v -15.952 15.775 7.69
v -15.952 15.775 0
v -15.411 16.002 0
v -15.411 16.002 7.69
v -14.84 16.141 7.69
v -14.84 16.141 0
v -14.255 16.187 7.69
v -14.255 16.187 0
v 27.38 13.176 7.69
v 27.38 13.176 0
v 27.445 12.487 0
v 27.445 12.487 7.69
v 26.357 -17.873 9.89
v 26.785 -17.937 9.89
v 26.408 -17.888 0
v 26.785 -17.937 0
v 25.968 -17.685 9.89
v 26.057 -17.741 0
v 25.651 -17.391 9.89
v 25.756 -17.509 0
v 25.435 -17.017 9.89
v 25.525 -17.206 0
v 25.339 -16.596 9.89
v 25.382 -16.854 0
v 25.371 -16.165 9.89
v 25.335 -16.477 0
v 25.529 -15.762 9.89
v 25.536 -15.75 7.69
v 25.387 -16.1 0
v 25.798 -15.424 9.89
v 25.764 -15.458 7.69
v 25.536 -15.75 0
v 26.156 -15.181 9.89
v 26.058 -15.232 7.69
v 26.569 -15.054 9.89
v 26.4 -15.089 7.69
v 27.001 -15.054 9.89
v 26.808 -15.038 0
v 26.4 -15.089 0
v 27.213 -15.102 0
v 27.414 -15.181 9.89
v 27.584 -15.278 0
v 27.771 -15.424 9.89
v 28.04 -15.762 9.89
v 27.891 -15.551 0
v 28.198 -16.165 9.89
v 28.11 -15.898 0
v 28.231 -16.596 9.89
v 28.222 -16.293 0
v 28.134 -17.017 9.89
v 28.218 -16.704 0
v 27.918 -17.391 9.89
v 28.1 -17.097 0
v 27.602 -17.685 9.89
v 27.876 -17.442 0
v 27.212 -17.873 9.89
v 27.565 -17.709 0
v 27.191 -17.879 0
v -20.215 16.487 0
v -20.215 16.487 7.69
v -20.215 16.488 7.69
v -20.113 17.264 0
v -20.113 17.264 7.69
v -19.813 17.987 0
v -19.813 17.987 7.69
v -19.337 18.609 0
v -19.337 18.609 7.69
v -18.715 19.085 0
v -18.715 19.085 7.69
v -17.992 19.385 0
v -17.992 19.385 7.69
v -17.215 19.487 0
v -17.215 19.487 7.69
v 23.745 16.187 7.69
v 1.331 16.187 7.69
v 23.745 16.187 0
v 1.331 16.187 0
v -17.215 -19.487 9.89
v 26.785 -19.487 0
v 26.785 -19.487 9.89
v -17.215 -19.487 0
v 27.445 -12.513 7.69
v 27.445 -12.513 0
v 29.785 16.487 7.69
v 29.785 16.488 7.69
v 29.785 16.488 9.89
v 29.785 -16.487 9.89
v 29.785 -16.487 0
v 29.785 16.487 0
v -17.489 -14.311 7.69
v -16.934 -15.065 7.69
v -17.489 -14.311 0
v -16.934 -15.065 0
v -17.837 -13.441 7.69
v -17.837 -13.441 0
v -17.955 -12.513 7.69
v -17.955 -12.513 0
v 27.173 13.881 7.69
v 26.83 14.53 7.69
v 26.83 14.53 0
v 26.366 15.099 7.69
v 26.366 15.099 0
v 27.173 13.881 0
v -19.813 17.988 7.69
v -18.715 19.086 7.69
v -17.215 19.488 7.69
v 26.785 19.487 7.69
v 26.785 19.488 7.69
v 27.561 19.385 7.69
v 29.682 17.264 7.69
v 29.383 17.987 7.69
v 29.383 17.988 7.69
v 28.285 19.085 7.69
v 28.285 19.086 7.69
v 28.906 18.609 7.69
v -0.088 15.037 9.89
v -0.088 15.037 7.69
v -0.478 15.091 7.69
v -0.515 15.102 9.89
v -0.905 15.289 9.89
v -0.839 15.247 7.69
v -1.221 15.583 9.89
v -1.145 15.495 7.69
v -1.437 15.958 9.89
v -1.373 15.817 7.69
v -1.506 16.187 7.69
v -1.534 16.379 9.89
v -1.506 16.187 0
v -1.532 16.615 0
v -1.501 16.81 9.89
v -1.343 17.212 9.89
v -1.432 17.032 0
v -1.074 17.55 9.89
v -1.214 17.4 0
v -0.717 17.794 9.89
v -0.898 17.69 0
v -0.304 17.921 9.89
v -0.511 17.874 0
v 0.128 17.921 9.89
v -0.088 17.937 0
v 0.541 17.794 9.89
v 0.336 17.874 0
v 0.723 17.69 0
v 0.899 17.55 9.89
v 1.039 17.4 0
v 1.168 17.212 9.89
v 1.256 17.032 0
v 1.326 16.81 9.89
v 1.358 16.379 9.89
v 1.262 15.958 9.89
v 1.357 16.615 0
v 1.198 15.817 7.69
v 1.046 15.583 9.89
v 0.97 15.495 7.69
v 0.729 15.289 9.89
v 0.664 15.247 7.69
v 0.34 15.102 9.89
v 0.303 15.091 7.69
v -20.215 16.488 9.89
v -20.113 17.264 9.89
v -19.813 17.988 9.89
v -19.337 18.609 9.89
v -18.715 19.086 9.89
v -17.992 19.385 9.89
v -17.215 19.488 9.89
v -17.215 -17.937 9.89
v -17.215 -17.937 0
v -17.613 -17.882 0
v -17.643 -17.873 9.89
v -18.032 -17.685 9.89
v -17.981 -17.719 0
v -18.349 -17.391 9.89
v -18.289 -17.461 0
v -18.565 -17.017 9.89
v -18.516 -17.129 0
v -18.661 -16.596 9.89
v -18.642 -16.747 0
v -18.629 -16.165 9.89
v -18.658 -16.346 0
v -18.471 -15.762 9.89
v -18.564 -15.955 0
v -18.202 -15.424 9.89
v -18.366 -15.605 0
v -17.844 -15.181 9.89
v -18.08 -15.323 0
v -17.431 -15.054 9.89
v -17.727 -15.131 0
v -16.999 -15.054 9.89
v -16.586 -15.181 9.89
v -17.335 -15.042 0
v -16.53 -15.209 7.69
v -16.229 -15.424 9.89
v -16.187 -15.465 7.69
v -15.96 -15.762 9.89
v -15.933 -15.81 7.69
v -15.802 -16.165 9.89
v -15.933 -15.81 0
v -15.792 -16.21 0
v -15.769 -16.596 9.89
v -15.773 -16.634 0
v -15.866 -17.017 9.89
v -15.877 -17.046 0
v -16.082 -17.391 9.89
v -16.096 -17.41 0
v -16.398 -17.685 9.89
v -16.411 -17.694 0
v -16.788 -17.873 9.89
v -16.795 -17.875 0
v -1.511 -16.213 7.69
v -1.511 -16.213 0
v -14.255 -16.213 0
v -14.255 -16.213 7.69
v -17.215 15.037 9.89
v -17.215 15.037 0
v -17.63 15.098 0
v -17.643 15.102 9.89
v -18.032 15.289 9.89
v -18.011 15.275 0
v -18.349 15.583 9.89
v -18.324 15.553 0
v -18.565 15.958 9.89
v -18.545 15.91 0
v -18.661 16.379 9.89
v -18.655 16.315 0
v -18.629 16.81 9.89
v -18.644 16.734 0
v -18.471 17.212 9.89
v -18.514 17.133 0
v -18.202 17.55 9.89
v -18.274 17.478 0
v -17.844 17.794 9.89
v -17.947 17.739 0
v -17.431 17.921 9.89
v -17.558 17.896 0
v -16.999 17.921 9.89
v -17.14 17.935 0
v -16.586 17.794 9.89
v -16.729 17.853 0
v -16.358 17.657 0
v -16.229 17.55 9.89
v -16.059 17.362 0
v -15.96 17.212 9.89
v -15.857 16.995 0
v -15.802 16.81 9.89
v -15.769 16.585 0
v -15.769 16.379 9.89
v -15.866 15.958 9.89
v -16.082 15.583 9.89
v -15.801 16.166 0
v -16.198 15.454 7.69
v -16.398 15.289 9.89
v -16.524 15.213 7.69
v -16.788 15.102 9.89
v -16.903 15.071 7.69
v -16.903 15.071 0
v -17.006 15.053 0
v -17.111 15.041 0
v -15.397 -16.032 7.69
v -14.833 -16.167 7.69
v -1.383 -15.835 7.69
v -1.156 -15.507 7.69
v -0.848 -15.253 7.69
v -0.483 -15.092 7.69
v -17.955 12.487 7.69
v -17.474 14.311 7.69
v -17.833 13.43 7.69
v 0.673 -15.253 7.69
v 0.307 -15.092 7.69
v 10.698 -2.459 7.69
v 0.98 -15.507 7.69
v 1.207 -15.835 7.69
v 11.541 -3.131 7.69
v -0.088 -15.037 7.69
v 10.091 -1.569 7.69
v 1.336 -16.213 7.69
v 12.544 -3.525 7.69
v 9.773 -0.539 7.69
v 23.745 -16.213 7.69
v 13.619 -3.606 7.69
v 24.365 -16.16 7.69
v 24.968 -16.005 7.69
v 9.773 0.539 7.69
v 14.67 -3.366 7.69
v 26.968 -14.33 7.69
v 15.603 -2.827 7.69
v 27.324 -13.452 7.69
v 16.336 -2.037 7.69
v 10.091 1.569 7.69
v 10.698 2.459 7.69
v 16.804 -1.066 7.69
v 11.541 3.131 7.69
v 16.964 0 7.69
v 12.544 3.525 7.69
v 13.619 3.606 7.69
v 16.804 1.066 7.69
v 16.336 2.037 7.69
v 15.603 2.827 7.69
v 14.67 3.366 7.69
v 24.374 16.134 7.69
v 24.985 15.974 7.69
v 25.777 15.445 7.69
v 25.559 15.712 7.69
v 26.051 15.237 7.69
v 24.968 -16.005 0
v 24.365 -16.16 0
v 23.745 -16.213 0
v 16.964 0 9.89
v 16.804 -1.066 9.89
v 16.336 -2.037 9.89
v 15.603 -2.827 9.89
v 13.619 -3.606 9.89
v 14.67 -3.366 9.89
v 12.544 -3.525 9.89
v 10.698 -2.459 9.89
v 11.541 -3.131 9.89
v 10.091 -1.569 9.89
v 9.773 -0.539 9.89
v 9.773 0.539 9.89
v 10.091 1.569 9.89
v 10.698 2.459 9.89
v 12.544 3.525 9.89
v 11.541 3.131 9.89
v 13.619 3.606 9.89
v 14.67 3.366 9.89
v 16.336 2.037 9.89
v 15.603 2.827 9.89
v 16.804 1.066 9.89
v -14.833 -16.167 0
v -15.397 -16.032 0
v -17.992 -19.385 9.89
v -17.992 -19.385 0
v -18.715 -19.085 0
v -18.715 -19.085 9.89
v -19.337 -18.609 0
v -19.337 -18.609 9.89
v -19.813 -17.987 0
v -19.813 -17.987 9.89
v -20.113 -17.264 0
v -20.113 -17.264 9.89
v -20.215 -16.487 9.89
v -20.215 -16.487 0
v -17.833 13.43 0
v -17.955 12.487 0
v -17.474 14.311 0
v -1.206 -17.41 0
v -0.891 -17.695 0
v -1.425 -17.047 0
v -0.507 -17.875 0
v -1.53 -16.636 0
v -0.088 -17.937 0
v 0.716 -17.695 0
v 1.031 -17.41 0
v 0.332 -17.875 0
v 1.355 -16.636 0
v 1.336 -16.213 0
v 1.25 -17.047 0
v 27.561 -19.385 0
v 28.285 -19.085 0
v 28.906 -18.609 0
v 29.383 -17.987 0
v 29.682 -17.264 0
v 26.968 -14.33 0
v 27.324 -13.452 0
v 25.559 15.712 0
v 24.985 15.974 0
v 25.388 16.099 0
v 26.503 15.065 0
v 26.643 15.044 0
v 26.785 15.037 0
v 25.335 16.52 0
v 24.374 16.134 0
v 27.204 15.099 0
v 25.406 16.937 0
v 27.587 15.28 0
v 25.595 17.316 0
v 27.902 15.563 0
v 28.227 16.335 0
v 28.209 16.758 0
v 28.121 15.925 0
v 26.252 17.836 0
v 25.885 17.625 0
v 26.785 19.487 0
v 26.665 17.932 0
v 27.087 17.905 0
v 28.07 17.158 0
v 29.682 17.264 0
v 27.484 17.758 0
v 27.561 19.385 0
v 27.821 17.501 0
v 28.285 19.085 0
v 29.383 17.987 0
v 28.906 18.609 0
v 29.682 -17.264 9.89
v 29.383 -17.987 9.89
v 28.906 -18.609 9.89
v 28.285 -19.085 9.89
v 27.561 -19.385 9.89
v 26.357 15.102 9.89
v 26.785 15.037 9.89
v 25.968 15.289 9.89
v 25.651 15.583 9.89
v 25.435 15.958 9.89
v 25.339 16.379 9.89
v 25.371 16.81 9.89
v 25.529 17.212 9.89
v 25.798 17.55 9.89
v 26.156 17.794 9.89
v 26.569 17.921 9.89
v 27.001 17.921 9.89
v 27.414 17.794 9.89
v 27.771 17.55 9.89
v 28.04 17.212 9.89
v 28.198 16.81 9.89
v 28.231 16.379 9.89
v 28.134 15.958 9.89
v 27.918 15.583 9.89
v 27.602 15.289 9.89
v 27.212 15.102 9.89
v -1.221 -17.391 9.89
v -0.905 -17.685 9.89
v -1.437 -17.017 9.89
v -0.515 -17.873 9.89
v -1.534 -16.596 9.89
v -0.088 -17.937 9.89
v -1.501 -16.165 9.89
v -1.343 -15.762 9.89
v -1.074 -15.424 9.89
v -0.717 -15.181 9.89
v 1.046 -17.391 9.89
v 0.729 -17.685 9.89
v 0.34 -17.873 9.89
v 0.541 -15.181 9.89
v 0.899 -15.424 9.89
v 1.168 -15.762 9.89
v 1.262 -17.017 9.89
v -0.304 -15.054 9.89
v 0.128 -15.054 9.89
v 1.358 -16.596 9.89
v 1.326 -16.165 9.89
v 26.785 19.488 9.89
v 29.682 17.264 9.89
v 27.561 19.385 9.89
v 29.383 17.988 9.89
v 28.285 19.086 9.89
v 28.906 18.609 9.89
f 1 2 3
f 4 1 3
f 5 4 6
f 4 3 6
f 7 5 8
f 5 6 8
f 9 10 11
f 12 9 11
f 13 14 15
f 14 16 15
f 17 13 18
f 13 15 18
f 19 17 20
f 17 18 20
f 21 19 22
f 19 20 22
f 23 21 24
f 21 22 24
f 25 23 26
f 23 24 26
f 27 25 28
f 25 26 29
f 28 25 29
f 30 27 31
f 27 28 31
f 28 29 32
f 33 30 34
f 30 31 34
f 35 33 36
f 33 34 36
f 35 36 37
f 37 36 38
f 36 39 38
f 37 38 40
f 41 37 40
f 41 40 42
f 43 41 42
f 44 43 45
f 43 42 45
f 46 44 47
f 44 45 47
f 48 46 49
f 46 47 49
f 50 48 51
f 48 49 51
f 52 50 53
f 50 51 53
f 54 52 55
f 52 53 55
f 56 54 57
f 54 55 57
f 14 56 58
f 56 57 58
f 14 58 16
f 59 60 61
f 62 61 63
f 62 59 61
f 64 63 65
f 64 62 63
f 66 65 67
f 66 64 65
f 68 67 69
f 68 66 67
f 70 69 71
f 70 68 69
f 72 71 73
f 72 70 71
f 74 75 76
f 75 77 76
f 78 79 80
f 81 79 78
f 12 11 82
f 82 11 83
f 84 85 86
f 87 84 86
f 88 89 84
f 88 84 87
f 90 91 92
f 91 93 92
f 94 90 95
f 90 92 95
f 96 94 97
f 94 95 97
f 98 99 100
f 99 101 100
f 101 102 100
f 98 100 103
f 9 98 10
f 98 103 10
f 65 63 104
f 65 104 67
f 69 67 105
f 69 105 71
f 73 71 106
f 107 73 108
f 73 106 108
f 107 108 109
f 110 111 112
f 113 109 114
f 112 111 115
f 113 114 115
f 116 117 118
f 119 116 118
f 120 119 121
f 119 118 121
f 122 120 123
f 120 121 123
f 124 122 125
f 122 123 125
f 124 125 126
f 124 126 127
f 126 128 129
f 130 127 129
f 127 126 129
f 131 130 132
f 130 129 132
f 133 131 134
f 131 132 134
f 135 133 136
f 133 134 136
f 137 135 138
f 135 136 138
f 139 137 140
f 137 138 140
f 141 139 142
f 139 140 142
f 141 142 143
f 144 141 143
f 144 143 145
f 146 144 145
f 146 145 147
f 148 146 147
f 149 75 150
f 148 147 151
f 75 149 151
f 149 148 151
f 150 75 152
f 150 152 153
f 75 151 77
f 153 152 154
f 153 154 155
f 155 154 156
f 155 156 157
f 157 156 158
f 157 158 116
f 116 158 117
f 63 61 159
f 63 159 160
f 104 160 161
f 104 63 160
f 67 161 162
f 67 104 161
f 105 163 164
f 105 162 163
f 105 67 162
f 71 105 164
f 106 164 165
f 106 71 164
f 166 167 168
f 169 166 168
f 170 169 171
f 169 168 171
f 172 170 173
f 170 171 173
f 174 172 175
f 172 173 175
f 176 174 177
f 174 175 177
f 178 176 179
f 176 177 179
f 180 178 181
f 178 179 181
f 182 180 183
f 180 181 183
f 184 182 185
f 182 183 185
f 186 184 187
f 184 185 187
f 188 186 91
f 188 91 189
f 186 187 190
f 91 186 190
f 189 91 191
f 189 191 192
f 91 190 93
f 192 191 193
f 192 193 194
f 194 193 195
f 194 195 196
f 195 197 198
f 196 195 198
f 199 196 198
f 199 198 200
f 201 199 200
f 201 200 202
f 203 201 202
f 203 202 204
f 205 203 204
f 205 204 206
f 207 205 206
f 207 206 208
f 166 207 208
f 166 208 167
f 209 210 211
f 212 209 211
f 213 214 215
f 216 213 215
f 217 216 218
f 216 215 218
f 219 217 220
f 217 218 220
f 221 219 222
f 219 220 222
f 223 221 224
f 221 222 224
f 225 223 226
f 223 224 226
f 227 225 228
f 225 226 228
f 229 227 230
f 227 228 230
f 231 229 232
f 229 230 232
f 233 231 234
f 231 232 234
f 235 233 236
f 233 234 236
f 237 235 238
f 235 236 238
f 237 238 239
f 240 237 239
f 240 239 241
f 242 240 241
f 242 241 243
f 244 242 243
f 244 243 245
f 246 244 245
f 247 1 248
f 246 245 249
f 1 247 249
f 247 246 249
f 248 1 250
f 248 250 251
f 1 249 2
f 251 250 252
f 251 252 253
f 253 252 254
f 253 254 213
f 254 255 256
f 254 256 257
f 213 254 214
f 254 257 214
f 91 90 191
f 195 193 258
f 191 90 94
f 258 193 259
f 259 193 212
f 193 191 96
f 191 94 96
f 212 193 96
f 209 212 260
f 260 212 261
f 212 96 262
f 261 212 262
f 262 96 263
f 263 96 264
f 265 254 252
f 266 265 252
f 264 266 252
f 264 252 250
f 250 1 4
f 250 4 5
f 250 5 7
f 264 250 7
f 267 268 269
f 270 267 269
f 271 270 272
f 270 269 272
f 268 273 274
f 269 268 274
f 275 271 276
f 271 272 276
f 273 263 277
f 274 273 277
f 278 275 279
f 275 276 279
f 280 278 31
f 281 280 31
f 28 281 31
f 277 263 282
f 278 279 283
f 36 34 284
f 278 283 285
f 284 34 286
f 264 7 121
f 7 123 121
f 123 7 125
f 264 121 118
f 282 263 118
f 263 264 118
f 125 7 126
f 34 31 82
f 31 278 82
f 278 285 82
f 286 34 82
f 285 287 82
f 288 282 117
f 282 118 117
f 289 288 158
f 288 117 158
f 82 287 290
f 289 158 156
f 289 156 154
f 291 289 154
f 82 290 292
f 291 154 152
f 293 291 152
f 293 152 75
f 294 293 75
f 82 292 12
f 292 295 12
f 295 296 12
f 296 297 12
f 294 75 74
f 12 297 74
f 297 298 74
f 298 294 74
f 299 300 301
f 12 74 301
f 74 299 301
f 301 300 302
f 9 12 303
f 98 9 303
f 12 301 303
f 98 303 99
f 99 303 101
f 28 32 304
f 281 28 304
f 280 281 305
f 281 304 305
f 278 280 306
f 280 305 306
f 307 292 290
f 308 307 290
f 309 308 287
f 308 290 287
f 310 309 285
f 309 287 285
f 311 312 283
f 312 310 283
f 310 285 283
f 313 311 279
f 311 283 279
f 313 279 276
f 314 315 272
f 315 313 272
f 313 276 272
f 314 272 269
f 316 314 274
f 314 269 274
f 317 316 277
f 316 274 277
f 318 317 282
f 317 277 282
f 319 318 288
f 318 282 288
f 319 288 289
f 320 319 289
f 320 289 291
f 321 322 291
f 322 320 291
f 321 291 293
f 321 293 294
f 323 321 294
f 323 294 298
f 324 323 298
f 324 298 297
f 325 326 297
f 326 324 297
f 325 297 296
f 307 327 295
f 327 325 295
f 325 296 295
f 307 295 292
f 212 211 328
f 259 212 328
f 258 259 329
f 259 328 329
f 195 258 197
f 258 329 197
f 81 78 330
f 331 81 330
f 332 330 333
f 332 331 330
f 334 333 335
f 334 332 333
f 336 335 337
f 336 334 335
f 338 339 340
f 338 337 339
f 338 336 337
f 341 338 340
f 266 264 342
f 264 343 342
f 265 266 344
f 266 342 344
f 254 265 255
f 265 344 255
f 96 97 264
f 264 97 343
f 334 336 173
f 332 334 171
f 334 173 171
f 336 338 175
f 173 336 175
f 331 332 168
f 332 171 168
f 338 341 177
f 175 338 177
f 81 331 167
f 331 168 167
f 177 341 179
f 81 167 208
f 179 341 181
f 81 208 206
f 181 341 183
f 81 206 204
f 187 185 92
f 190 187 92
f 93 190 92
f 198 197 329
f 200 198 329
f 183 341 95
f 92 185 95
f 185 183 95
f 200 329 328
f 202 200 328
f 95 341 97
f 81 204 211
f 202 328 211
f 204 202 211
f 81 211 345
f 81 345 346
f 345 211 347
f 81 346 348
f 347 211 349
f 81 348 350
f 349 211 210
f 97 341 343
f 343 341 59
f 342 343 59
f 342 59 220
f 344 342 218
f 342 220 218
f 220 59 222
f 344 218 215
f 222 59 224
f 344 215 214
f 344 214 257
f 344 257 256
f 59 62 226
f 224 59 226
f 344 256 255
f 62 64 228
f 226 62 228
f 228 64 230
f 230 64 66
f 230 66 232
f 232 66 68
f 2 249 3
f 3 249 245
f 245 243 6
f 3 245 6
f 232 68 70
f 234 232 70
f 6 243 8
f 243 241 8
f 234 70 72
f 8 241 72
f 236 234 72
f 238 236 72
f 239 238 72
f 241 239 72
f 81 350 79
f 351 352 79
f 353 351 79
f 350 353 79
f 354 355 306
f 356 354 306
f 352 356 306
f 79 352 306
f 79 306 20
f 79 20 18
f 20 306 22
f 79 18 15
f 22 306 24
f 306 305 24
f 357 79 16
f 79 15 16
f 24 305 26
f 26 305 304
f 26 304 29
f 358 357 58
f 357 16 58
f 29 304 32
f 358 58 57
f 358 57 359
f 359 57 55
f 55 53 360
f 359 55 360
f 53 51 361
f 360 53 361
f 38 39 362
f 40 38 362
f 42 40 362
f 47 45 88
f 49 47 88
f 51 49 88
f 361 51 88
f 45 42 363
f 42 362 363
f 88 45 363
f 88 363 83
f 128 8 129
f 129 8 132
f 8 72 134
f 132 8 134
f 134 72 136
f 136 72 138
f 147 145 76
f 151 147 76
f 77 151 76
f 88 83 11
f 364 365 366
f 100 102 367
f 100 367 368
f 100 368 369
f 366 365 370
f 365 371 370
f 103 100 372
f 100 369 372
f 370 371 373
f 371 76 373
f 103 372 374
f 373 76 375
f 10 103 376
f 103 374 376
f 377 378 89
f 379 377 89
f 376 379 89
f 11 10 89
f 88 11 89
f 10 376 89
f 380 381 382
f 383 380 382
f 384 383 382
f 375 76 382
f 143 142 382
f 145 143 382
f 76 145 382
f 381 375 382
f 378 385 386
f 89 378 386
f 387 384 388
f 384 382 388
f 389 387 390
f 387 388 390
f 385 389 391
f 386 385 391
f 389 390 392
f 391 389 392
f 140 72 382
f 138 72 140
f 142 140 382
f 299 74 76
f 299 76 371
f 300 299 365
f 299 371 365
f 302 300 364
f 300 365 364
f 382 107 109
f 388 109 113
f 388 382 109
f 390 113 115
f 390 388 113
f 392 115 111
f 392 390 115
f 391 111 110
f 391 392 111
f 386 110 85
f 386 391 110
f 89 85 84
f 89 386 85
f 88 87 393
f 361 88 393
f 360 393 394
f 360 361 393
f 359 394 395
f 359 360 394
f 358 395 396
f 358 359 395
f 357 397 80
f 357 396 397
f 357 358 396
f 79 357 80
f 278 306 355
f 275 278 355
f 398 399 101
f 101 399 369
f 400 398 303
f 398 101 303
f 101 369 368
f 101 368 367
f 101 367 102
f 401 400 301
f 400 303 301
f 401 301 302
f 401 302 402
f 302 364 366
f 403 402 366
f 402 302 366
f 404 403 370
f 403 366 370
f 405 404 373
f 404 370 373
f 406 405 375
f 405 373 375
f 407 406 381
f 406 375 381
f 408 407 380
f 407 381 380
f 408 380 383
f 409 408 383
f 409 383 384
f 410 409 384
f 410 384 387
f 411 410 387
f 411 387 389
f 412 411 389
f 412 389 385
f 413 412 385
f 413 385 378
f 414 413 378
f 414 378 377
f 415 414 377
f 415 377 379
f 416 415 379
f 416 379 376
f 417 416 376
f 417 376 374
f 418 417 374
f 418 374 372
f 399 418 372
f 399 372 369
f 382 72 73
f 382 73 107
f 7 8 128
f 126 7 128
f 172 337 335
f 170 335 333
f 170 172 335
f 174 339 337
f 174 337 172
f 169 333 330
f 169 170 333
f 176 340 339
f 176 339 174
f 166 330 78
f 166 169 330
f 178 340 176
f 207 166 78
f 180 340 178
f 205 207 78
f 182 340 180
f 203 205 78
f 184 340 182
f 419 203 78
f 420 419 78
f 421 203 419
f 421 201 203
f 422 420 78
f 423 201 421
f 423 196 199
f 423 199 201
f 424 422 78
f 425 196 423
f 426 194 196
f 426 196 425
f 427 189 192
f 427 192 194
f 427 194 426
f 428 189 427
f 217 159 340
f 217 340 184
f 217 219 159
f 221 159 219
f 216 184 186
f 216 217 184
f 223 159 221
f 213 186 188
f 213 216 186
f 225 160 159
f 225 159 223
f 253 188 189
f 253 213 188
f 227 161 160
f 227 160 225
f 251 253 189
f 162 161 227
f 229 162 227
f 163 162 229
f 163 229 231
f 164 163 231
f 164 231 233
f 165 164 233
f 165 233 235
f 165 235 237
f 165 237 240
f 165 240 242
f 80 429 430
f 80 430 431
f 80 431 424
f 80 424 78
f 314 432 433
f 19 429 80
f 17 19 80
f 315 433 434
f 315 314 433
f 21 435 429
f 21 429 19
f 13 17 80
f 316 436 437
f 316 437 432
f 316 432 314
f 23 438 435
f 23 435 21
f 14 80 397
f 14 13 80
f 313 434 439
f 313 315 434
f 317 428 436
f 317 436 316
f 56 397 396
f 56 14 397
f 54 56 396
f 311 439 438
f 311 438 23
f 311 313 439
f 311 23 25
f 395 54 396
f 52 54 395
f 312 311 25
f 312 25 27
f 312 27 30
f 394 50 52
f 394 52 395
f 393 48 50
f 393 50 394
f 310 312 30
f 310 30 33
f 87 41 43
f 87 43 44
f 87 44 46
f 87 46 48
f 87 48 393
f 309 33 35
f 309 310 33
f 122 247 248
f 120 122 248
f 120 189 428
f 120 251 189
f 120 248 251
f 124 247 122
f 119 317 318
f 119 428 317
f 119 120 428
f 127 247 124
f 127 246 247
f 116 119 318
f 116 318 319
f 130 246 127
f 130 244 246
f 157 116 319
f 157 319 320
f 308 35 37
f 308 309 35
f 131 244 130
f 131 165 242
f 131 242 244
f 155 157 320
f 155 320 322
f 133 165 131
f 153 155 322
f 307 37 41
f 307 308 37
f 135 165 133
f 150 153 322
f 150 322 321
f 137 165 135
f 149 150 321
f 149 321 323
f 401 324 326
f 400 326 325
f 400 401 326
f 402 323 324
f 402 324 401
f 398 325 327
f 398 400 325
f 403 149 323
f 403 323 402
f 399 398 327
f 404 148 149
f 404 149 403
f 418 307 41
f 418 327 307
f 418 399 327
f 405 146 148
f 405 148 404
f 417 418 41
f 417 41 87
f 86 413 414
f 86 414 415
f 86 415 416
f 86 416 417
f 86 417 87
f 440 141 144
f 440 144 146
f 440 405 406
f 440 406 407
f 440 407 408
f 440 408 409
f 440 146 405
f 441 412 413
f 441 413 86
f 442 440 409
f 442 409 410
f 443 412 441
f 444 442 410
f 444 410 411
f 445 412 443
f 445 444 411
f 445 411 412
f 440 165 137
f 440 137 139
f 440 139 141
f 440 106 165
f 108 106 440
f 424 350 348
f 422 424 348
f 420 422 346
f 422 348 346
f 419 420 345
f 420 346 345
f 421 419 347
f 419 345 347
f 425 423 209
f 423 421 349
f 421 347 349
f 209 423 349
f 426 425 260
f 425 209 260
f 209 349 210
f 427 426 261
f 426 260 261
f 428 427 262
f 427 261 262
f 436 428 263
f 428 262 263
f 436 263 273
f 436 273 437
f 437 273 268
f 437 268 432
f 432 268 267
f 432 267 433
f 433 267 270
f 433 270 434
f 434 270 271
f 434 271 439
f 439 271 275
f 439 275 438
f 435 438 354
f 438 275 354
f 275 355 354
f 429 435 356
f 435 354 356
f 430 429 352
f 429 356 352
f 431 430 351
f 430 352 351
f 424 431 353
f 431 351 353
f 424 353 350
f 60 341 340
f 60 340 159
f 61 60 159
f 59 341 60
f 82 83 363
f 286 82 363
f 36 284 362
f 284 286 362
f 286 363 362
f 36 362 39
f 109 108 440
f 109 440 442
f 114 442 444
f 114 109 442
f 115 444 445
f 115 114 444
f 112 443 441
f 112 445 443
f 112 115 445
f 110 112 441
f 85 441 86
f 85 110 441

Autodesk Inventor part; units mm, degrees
ref_plane "YZ Plane" through (0, 0, 0) normal (1, 0, 0) x (0, 1, 0)
ref_plane "XZ Plane" through (0, 0, 0) normal (0, 1, 0) x (-1, 0, 0)
ref_plane "Arbeitsebene1" through (0, 0, 0) normal (0, 0, 1) x (1, 0, 0)
sketch "Skizze1" plane through (0, 0, 0) normal (0, 0, 1) x (1, 0, 0)
  arc A0 (-16.0148, -15.7672) -> (-14.255, -16.2126) centre (-14.255, -12.5126) ccw projected
  line L0 (-17.955, -12.5126) -> (-17.955, 12.4874) projected
  arc A1 (-14.255, 16.1874) -> (-17.955, 12.4874) centre (-14.255, 12.4874) ccw projected
  line L1 (-14.255, 16.1874) -> (23.745, 16.1874) projected
  arc A2 (25.6605, 15.6531) -> (23.745, 16.1874) centre (23.745, 12.4874) ccw projected
  arc A3 (26.3244, -15.1653) -> (27.445, -12.5126) centre (23.745, -12.5126) ccw projected
  line L2 (23.745, -16.2126) -> (-14.255, -16.2126) projected
  line L3 (-17.2153, 19.4874) -> (26.7847, 19.4874) projected
  arc A4 (-17.2153, 19.4874) -> (-20.2153, 16.4874) centre (-17.2153, 16.4874) ccw projected
  line L4 (-20.2153, -16.4874) -> (-20.2153, 16.4874) projected
  arc A5 (-20.2153, -16.4874) -> (-17.2153, -19.4874) centre (-17.2153, -16.4874) ccw projected
  line L5 (26.7847, -19.4874) -> (-17.2153, -19.4874) projected
  arc A6 (-16.0148, -15.7672) -> (-14.255, -16.2126) centre (-14.255, -12.5126) ccw projected
  line L6 (-17.955, -12.5126) -> (-17.955, 12.4874) projected
  arc A7 (-14.255, 16.1874) -> (-17.955, 12.4874) centre (-14.255, 12.4874) ccw projected
  line L7 (-14.255, 16.1874) -> (23.745, 16.1874) projected
  arc A8 (25.6605, 15.6531) -> (23.745, 16.1874) centre (23.745, 12.4874) ccw projected
  arc A9 (26.3244, -15.1653) -> (27.445, -12.5126) centre (23.745, -12.5126) ccw projected
  line L8 (23.745, -16.2126) -> (-14.255, -16.2126) projected
  line L9 (-17.2153, 19.4874) -> (26.7847, 19.4874) projected
  line L10 (26.7847, -19.4874) -> (-17.2153, -19.4874) projected
  line L11 (-20.2153, -16.4874) -> (-20.2153, 16.4874) projected
  arc A10 (-20.2153, -16.4874) -> (-17.2153, -19.4874) centre (-17.2153, -16.4874) ccw projected
  line L12 (29.7847, 16.4874) -> (29.7847, 15.1761) projected
  arc A11 (29.7847, 16.4874) -> (26.7847, 19.4874) centre (26.7847, 16.4874) ccw projected
  arc A12 (26.7847, -19.4874) -> (29.7847, -16.4874) centre (26.7847, -16.4874) ccw projected
  line L13 (29.7847, 16.4874) -> (29.7847, 15.1761) projected
  arc A13 (29.7847, 16.4874) -> (26.7847, 19.4874) centre (26.7847, 16.4874) ccw projected
  arc A14 (26.7847, -19.4874) -> (29.7847, -16.4874) centre (26.7847, -16.4874) ccw projected
  line L14 (28.445, 12.4874) -> (28.445, -12.5126)
  arc A15 (26.2819, 15.1808) -> (25.6605, 15.6531) centre (26.7847, 16.4874) ccw projected
  arc A16 (23.745, -16.2126) -> (25.6293, -15.6968) centre (23.745, -12.5126) ccw projected
  arc A17 (25.6293, -15.6968) -> (26.3244, -15.1653) centre (26.7847, -16.4874) ccw projected
  arc A18 (-16.8692, -15.1309) -> (-16.0148, -15.7672) centre (-17.2153, -16.4874) ccw projected
  arc A19 (27.3804, 13.1761) -> (26.2819, 15.1808) centre (23.745, 12.4874) ccw projected
  line L15 (23.745, 13.4874) -> (-14.255, 13.4874) projected
  line L16 (-14.255, -13.5126) -> (23.745, -13.5126) projected
  line L17 (25.0985, -12.5126) -> (27.445, -12.5126) projected
  arc A20 (-17.955, -12.5126) -> (-16.8692, -15.1309) centre (-14.255, -12.5126) ccw projected
  arc A21 (26.2819, 15.1808) -> (25.6605, 15.6531) centre (26.7847, 16.4874) ccw projected
  arc A22 (23.745, -16.2126) -> (25.6293, -15.6968) centre (23.745, -12.5126) ccw projected
  arc A23 (25.6293, -15.6968) -> (26.3244, -15.1653) centre (26.7847, -16.4874) ccw projected
  arc A24 (-16.8692, -15.1309) -> (-16.0148, -15.7672) centre (-17.2153, -16.4874) ccw projected
  arc A25 (27.3804, 13.1761) -> (26.2819, 15.1808) centre (23.745, 12.4874) ccw projected
  line L18 (23.745, 13.4874) -> (-14.255, 13.4874) projected
  line L19 (-14.255, -13.5126) -> (23.745, -13.5126) projected
  line L20 (25.0985, -12.5126) -> (27.445, -12.5126) projected
  arc A26 (-17.955, -12.5126) -> (-16.8692, -15.1309) centre (-14.255, -12.5126) ccw projected
  circle A27 centre (-17.2153, 16.4874) radius 1.15
  circle A28 centre (26.7847, 16.4874) radius 1.4
  circle A29 centre (26.7847, -16.4874) radius 1.4
  circle A30 centre (-17.2153, -16.4874) radius 1.4
  circle A31 centre (-17.2153, 16.4874) radius 1.15 projected
  circle A32 centre (-17.2153, 16.4874) radius 1.15 projected
  line L21 (25.0985, -9.7969) -> (25.0985, -12.5126) projected
  line L22 (18.0985, 10.1761) -> (-2.8285, 10.1761) projected
  line L23 (-2.8285, 10.1761) -> (-2.8285, 13.1761) projected
  arc A33 (24.4701, 13.1761) -> (23.745, 13.4874) centre (23.745, 12.4874) ccw projected
  arc A34 (23.745, -13.5126) -> (24.7038, -12.7969) centre (23.745, -12.5126) ccw projected
  line L24 (24.7038, -12.7969) -> (-2.8285, -12.7969) projected
  line L25 (-2.8285, -12.7969) -> (-2.8285, -9.7969) projected
  line L26 (-2.8285, -9.7969) -> (25.0985, -9.7969) projected
  circle A35 centre (-17.2153, 16.4874) radius 1.15 projected
  circle A36 centre (-17.2153, 16.4874) radius 1.15 projected
  line L27 (25.0985, -9.7969) -> (25.0985, -12.5126) projected
  line L28 (18.0985, 10.1761) -> (-2.8285, 10.1761) projected
  line L29 (-2.8285, 10.1761) -> (-2.8285, 13.1761) projected
  arc A37 (24.4701, 13.1761) -> (23.745, 13.4874) centre (23.745, 12.4874) ccw projected
  arc A38 (23.745, -13.5126) -> (24.7038, -12.7969) centre (23.745, -12.5126) ccw projected
  line L30 (24.7038, -12.7969) -> (-2.8285, -12.7969) projected
  line L31 (-2.8285, -12.7969) -> (-2.8285, -9.7969) projected
  line L32 (-2.8285, -9.7969) -> (25.0985, -9.7969) projected
  line L33 (27.445, 12.4874) -> (27.445, -12.5126)
  arc A39 (27.7847, 13.1761) -> (29.7847, 15.1761) centre (27.7847, 15.1761) ccw projected
  arc A40 (-17.2153, 19.4874) -> (-20.2153, 16.4874) centre (-17.2153, 16.4874) ccw projected
  line L34 (29.7847, 2.2345) -> (29.7847, -16.4874) projected
  arc A41 (29.7847, 2.2345) -> (27.7847, 4.2345) centre (27.7847, 2.2345) ccw projected
  line L35 (27.7847, 4.2345) -> (22.0985, 4.2345) projected
  arc A42 (20.0985, 6.2345) -> (22.0985, 4.2345) centre (22.0985, 6.2345) ccw projected
  line L36 (20.0985, 6.2345) -> (20.0985, 8.1761) projected
  arc A43 (20.0985, 8.1761) -> (18.0985, 10.1761) centre (18.0985, 8.1761) ccw projected
  line L37 (-2.8285, 13.1761) -> (24.4701, 13.1761) projected
  arc A44 (-14.255, 13.4874) -> (-15.255, 12.4874) centre (-14.255, 12.4874) ccw projected
  line L38 (-15.255, 12.4874) -> (-15.255, -12.5126) projected
  arc A45 (-15.255, -12.5126) -> (-14.255, -13.5126) centre (-14.255, -12.5126) ccw projected
  line L39 (27.3804, 13.1761) -> (27.7847, 13.1761) projected
  arc A46 (27.7847, 13.1761) -> (29.7847, 15.1761) centre (27.7847, 15.1761) ccw projected
  line L40 (29.7847, 2.2345) -> (29.7847, -16.4874) projected
  arc A47 (29.7847, 2.2345) -> (27.7847, 4.2345) centre (27.7847, 2.2345) ccw projected
  line L41 (27.7847, 4.2345) -> (22.0985, 4.2345) projected
  arc A48 (20.0985, 6.2345) -> (22.0985, 4.2345) centre (22.0985, 6.2345) ccw projected
  line L42 (20.0985, 6.2345) -> (20.0985, 8.1761) projected
  arc A49 (20.0985, 8.1761) -> (18.0985, 10.1761) centre (18.0985, 8.1761) ccw projected
  line L43 (-2.8285, 13.1761) -> (24.4701, 13.1761) projected
  arc A50 (-14.255, 13.4874) -> (-15.255, 12.4874) centre (-14.255, 12.4874) ccw projected
  line L44 (-15.255, 12.4874) -> (-15.255, -12.5126) projected
  arc A51 (-15.255, -12.5126) -> (-14.255, -13.5126) centre (-14.255, -12.5126) ccw projected
  line L45 (27.3804, 13.1761) -> (27.7847, 13.1761) projected
  line L46 (27.3804, 13.1761) -> (27.445, 12.4874)
  line L47 (29.7847, 2.2345) -> (29.7847, 15.1761)
  point P0 (0, 0)
  point P1 (-15.255, 11.1874)
  point P2 (23.745, 12.4874)
  point P3 (23.745, -12.5126)
  point P4 (-17.8427, 15.5236)
  point P5 (-14.255, 12.4874)
  point P6 (-16.1103, 16.8058)
  point P7 (-14.255, 12.4874)
  point P8 (-17.2153, -19.4874)
  point P9 (25.0985, 12.4874)
  point P10 (25.0985, 10.1761)
  point P11 (27.445, -12.5126)
  point P12 (26.3244, -15.1653)
  point P13 (25.6293, -15.6968)
  point P14 (-16.0148, -15.7672)
  point P15 (-16.8692, -15.1309)
  point P16 (25.6605, 15.6531)
  point P17 (26.2819, 15.1808)
  point P18 (29.7847, 15.1761)
  point P19 (25.6605, 15.6531)
  point P20 (26.2819, 15.1808)
  point P21 (27.445, 4.2345)
ref_plane "Arbeitsebene2" through (-3.9015, -6.25, 7.6898) normal (0, 0, 1) x (1, 0, 0)
extrude "Extrusion1" add sketch "Skizze1" along normal up to surface (7.6898 mm away) contours A0 L2 A16 A17 A3 L33 L35 A41 L34 A12 L5 A5 L4 A4 L3 A11 L12 A39 L39 A19 A15 A2 L1 A1 L0 A20 A18 | L33 L46 L39 A39 L47 A41 L35
sketch "Skizze2" plane through (-17.2153, -19.4874, 7.6898) normal (0, 0, 1) x (1, 0, 0)
  arc A0 (0, 38.9749) -> (-3, 35.9749) centre (0, 35.9749) ccw
  line L0 (-3, 3) -> (-3, 35.9749)
  arc A1 (-3, 3) -> (0, 0) centre (0, 3) ccw
  circle A2 centre (30.5638, 19.4874) radius 3.6158
  arc A3 (44, 0) -> (47, 3) centre (44, 3) ccw
  arc A4 (47, 35.9749) -> (44, 38.9749) centre (44, 35.9749) ccw
  line L1 (0, 38.9749) -> (44, 38.9749)
  line L2 (44, 0) -> (0, 0)
  circle A5 centre (30.5638, 19.4874) radius 3.6158
  line L3 (34.6638, 15.3874) -> (26.4638, 15.3874)
  line L4 (26.4638, 15.3874) -> (26.4638, 23.5874)
  line L5 (26.4638, 23.5874) -> (34.6638, 23.5874)
  line L6 (34.6638, 23.5874) -> (34.6638, 15.3874)
  line L7 (34.6638, 15.3874) -> (26.4638, 23.5874) construction
  line L8 (26.4638, 15.3874) -> (34.6638, 23.5874) construction
  arc A6 (0.3462, 4.3565) -> (1.2005, 3.7202) centre (0, 3) ccw
  circle A7 centre (0, 35.9749) radius 1.15
  arc A8 (43.4972, 34.6683) -> (42.8758, 35.1405) centre (44, 35.9749) ccw
  arc A9 (42.8446, 3.7906) -> (43.5397, 4.3222) centre (44, 3) ccw
  arc A10 (-3, 3) -> (0, 0) centre (0, 3) ccw
  circle A11 centre (0, 3) radius 1.4
  circle A12 centre (0, 35.9749) radius 1.4
  circle A13 centre (44, 35.9749) radius 1.4
  circle A14 centre (44, 3) radius 1.4
  circle A15 centre (30.5638, 19.4874) radius 3.75
  line L9 (44.6604, 6.9749) -> (44.6604, 31.9749)
  arc A16 (43.5397, 4.3222) -> (44.6604, 6.9749) centre (40.9604, 6.9749) ccw
  arc A17 (42.8446, 3.7906) -> (43.5397, 4.3222) centre (44, 3) ccw
  arc A18 (40.9604, 3.2749) -> (42.8446, 3.7906) centre (40.9604, 6.9749) ccw
  line L10 (2.9604, 3.2749) -> (40.9604, 3.2749)
  arc A19 (1.2005, 3.7202) -> (2.9604, 3.2749) centre (2.9604, 6.9749) ccw
  arc A20 (0.3462, 4.3565) -> (1.2005, 3.7202) centre (0, 3) ccw
  arc A21 (-0.7396, 6.9749) -> (0.3462, 4.3565) centre (2.9604, 6.9749) ccw
  line L11 (-0.7396, 31.9749) -> (-0.7396, 6.9749)
  arc A22 (2.9604, 35.6749) -> (-0.7396, 31.9749) centre (2.9604, 31.9749) ccw
  line L12 (40.9604, 35.6749) -> (2.9604, 35.6749)
  arc A23 (42.8758, 35.1405) -> (40.9604, 35.6749) centre (40.9604, 31.9749) ccw
  arc A24 (43.4972, 34.6683) -> (42.8758, 35.1405) centre (44, 35.9749) ccw
  arc A25 (44.5957, 32.6636) -> (43.4972, 34.6683) centre (40.9604, 31.9749) ccw
  line L13 (47, 35.9749) -> (47, 3)
  line L14 (44.6604, 31.9749) -> (44.5957, 32.6636)
  point P0 (17.2153, 19.4874)
  point P1 (0.3462, 4.3565)
  point P2 (1.2005, 3.7202)
  point P3 (43.4972, 34.6683)
  point P4 (42.8758, 35.1405)
  point P5 (42.8446, 3.7906)
  point P6 (43.5397, 4.3222)
extrude "Extrusion2" add sketch "Skizze2" along normal blind 2.2 contours L1 A4 L13 A3 L2 A1 L0 A0 | L3 L4 L5 L6 | A11 A6 | A21 L11 A22 A12 L12 A23 A13 A25 L14 L9 A16 A14 A18 L10 A19 A11 | A22 A12 | A12 A22 | A14 A9 | A8 A13 | A15
sketch "Sketch13" plane through (-17.2153, -19.4874, 9.8898) normal (0, 0, 1) x (1, 0, 0)
  circle A0 centre (30.5638, 19.4874) radius 7 projected
  circle A1 centre (44, 3) radius 1.4 projected
  circle A2 centre (44, 35.9749) radius 1.4 projected
  line L0 (17.1276, 35.9749) -> (44, 35.9749)
  line L1 (44, 35.9749) -> (44, 3)
  line L2 (44, 3) -> (17.1276, 3)
  line L3 (17.1276, 3) -> (17.1276, 35.9749)
  line L4 (17.1276, 35.9749) -> (44, 3) construction
  line L5 (44, 35.9749) -> (17.1276, 3) construction
  circle A3 centre (0, 35.9749) radius 1.15 projected
  circle A4 centre (0, 3) radius 1.4 projected
  point P0 (17.2153, 19.4874)
hole "Hole1" at (26.7847, -16.4874, 9.8898) at (-0.0877, -16.4874, 9.8898) at (-0.0877, 16.4874, 9.8898) at (26.7847, 16.4874, 9.8898) at (-17.2153, 16.4874, 9.8898) at (-17.2153, -16.4874, 9.8898) direction (0, 0, -1) diameter 2.9 depth 15 tip angle 118
equation "\"d50\" = 0.125 * Sketch7_Pitch"
equation "\"Sketch7_Pitch\" = 1"
equation "\"d52\" = 60deg"
properties part number "OutputFile"
